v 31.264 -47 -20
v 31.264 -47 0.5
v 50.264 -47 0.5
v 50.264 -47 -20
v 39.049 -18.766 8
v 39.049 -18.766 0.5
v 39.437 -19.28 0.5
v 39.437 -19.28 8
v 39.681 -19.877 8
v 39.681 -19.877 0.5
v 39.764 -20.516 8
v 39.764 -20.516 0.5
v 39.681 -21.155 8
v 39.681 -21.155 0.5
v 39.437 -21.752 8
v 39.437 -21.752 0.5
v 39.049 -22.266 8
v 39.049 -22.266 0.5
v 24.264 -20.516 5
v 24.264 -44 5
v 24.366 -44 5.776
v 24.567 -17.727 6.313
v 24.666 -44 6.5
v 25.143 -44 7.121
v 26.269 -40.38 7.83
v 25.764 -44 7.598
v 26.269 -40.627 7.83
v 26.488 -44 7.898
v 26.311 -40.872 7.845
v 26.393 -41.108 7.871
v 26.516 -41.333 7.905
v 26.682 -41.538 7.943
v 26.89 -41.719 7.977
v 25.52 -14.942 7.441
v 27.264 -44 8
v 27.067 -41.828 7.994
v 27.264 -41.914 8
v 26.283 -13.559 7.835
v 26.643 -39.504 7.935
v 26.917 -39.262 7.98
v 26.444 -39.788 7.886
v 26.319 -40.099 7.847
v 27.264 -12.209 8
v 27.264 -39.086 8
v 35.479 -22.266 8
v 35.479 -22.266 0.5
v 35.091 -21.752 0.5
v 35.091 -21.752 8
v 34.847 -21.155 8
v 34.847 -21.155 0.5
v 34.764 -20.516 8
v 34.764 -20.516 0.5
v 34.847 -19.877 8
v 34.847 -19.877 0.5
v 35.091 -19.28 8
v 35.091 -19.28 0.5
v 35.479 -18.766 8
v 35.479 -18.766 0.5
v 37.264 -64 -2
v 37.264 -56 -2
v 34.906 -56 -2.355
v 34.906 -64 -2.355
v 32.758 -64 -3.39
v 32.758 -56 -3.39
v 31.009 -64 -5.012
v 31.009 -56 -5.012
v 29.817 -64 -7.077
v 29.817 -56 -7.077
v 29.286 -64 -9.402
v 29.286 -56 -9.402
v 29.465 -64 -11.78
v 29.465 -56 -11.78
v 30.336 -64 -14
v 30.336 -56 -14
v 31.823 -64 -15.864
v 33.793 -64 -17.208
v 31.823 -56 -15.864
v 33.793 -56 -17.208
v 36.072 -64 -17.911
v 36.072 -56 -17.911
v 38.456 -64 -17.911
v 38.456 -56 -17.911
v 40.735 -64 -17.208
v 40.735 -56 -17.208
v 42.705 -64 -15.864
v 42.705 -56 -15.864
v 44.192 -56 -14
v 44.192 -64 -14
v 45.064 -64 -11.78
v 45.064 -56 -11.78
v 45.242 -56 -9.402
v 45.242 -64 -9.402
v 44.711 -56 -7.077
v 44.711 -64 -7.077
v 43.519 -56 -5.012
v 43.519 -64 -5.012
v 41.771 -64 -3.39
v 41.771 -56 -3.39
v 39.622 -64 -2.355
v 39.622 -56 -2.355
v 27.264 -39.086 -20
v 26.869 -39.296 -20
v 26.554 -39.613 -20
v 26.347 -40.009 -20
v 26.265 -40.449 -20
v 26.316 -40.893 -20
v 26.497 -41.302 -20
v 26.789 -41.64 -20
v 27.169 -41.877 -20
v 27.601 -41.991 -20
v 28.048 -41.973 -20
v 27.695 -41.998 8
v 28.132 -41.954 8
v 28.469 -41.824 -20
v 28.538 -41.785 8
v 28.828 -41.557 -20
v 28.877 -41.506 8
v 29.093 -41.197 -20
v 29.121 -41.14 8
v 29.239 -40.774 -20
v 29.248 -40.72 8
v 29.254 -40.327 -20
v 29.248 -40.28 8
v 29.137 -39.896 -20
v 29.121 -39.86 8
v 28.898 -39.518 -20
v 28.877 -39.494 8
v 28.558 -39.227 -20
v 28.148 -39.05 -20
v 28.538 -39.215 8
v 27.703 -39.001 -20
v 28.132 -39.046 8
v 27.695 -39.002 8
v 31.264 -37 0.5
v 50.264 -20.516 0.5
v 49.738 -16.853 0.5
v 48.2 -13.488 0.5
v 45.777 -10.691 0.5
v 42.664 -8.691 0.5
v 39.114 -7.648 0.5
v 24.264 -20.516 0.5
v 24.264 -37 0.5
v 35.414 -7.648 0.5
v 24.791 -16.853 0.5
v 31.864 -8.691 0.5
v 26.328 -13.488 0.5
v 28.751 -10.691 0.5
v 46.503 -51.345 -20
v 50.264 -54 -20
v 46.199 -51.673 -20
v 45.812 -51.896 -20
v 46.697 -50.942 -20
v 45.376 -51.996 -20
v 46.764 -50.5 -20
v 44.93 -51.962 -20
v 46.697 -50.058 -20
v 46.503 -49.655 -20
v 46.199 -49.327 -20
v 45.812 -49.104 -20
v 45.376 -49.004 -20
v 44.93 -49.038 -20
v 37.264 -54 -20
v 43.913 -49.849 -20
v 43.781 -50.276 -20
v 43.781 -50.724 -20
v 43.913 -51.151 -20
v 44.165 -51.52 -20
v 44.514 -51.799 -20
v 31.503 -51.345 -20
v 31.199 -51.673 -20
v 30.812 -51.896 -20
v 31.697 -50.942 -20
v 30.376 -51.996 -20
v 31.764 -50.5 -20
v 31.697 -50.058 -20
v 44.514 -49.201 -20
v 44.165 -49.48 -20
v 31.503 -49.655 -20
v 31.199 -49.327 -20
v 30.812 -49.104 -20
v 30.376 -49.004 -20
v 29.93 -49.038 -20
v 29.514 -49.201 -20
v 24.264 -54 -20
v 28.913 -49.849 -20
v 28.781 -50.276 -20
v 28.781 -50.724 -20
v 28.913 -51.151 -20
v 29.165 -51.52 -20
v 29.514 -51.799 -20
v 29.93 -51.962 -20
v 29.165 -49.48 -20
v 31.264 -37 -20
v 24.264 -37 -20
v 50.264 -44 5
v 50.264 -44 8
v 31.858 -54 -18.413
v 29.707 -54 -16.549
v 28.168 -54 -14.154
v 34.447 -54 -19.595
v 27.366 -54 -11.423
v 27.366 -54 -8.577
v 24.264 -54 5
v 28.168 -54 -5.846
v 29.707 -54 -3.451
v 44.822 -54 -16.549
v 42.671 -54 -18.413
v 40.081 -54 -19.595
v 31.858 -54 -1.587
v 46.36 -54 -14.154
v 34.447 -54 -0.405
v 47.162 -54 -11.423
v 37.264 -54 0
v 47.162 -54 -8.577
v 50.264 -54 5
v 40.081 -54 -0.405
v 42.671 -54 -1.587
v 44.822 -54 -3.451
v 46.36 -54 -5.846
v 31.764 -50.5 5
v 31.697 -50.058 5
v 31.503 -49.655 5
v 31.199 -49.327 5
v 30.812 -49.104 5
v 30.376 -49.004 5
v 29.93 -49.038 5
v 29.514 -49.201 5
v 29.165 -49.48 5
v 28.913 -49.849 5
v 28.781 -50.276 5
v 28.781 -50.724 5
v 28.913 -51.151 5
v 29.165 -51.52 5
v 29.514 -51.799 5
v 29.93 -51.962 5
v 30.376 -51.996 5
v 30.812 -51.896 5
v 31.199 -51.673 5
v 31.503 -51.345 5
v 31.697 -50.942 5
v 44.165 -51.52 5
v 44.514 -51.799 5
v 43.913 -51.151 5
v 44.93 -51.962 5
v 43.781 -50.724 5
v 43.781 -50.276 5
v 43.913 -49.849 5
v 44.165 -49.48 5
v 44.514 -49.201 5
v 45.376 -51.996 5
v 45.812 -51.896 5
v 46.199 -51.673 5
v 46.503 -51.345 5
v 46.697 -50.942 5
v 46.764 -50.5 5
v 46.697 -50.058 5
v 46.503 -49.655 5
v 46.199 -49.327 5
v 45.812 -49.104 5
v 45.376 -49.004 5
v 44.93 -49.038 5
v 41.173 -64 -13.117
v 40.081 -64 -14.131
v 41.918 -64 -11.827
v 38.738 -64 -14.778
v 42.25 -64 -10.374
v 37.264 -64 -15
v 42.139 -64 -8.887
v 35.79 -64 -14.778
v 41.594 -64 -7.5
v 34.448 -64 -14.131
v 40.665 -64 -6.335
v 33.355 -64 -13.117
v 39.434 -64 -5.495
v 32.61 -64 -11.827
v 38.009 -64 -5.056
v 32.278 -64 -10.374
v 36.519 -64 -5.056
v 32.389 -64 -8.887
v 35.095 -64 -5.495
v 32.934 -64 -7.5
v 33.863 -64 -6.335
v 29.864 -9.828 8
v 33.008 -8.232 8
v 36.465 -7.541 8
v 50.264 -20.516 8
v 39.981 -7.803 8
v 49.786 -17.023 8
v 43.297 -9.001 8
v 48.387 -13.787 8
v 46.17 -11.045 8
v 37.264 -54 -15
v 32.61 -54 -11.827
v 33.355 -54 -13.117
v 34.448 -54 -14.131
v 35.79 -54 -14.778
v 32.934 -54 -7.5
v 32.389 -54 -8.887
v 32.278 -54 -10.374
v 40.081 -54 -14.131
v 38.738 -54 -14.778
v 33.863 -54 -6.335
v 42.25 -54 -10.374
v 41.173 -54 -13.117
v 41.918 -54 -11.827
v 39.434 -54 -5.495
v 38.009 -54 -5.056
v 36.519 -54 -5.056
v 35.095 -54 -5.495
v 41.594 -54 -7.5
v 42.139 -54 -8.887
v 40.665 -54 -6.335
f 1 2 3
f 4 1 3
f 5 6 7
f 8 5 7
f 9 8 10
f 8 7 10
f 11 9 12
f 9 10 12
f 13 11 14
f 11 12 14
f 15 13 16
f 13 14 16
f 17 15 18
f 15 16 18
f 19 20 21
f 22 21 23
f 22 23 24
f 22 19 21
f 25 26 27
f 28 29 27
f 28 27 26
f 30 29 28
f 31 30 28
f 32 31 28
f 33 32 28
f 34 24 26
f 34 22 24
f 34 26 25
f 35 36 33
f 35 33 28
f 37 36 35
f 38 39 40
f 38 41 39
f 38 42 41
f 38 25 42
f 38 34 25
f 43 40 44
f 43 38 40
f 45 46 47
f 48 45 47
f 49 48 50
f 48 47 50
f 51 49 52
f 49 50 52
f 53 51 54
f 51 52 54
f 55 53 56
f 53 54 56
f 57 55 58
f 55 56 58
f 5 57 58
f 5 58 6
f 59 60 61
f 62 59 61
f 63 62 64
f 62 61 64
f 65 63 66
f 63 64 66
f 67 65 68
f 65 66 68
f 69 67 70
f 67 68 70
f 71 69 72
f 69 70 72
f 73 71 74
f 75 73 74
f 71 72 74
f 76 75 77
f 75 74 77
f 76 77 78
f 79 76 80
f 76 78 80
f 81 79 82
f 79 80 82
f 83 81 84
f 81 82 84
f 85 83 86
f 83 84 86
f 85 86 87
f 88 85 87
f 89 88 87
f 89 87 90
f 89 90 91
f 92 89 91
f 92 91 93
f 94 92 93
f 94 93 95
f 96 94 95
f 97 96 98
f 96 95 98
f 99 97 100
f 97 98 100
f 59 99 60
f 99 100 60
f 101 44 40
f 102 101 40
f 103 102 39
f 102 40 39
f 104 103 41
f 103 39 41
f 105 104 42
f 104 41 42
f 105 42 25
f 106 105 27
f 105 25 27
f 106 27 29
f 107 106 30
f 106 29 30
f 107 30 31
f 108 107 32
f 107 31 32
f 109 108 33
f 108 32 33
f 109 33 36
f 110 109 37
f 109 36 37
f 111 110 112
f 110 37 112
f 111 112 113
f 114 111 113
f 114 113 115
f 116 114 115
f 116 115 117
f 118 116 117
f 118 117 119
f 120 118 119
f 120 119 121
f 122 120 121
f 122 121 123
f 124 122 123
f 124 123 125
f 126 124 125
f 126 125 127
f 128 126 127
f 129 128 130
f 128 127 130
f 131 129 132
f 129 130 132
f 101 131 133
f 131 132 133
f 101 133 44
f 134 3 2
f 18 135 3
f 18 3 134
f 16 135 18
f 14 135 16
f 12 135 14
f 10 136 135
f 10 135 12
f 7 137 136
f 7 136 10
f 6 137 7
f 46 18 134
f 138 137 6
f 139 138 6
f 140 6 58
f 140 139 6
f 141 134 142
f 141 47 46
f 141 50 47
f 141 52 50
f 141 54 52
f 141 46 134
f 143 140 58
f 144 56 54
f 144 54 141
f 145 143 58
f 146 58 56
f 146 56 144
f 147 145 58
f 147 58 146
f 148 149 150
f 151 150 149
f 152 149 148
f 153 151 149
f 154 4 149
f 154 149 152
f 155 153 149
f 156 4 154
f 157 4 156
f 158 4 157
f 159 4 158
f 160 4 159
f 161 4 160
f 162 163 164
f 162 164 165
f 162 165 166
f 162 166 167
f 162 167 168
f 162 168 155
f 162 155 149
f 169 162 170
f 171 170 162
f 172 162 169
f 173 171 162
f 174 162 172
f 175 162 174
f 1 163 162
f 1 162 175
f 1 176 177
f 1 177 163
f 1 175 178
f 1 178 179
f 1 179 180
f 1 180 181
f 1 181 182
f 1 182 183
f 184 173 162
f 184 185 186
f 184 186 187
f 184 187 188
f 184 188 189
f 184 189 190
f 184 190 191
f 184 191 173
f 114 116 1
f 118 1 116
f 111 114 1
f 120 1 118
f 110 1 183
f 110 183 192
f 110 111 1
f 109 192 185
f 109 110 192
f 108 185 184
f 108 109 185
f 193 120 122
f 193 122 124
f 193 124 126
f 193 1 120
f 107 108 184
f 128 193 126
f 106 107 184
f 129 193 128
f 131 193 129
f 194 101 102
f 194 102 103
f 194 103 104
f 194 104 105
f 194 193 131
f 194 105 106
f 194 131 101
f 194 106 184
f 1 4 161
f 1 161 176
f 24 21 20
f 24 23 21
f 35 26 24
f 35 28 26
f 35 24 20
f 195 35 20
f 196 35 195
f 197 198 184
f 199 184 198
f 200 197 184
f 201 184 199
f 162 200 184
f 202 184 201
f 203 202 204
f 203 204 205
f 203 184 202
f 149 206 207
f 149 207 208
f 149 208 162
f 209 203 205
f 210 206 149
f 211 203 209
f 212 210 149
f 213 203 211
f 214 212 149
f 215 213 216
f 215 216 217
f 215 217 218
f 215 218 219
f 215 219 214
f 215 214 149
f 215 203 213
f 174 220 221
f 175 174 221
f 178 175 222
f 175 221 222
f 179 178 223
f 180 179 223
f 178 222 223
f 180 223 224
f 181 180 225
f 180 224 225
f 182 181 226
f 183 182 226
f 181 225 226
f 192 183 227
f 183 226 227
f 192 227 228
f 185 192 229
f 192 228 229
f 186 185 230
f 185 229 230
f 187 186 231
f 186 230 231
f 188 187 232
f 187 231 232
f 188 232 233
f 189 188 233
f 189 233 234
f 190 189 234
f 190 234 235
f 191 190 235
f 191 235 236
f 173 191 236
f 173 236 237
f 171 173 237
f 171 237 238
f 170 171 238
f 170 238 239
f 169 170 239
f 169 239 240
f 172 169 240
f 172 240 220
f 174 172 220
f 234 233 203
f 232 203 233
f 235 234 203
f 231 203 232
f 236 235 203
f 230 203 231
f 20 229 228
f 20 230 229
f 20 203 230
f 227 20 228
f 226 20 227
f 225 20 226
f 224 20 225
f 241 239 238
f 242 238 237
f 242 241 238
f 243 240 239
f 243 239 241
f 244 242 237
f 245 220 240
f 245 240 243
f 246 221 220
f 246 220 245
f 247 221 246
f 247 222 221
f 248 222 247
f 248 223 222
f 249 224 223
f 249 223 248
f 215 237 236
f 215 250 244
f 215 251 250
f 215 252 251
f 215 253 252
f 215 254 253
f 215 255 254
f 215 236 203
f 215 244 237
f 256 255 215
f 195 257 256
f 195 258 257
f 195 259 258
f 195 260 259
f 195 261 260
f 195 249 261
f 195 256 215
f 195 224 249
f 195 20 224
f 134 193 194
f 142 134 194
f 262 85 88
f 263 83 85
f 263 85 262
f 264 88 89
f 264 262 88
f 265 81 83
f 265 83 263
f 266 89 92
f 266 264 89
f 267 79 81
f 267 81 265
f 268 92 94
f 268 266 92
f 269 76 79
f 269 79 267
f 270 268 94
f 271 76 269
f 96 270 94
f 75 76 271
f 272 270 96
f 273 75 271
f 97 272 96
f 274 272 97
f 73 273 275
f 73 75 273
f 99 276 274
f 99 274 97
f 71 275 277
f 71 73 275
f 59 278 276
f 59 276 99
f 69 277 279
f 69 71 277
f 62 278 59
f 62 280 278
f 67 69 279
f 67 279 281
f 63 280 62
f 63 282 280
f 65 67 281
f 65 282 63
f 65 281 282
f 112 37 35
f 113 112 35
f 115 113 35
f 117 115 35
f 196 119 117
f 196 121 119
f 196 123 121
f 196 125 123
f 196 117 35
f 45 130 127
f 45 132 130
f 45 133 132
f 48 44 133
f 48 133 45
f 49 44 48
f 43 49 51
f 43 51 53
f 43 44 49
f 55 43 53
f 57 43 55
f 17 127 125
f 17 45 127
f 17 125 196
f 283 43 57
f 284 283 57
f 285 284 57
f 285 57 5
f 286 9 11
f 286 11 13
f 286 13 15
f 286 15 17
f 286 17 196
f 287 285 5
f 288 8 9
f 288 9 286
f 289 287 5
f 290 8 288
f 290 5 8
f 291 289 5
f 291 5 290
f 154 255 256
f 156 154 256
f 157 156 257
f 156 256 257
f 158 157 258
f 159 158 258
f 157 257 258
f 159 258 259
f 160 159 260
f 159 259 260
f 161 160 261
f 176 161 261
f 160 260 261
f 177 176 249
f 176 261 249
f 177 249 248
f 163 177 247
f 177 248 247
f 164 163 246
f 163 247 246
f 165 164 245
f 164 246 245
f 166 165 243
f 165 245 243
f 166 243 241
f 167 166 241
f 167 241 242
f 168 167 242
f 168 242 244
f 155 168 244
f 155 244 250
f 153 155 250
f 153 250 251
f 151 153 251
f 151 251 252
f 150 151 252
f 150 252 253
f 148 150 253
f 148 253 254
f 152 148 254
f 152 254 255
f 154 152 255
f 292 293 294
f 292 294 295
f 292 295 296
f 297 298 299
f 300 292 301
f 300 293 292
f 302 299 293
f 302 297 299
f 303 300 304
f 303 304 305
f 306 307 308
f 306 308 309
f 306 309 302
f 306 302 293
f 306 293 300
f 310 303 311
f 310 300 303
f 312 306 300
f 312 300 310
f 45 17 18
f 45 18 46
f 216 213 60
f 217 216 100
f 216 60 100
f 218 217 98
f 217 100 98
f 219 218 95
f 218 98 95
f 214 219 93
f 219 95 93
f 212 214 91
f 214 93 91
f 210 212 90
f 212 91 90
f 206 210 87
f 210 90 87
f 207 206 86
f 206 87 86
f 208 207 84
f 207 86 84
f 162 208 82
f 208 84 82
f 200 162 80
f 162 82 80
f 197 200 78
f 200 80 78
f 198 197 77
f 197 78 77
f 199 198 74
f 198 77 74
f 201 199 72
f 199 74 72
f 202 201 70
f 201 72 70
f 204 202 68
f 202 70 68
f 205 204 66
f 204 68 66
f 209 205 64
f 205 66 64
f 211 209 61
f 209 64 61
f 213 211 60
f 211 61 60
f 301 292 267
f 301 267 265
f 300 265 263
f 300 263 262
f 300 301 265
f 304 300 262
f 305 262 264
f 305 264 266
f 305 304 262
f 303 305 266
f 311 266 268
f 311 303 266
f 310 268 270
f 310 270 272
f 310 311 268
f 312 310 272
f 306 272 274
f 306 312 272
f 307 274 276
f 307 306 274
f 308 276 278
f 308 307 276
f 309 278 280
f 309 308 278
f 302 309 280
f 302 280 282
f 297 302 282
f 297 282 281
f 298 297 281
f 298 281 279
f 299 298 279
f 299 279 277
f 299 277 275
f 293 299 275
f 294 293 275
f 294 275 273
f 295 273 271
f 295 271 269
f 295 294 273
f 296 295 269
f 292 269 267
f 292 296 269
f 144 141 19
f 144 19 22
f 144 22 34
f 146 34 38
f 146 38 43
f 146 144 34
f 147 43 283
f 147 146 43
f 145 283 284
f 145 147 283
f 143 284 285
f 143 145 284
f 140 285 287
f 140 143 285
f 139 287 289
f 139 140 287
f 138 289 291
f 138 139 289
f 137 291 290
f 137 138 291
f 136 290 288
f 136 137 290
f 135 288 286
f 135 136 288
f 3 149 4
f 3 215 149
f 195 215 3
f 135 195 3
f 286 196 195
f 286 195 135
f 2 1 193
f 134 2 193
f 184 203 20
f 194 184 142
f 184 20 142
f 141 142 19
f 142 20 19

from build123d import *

# Parameters (mm, degrees)
SKETCH1_W           = 26
SKETCH1_H           = 50
BOSS_EXTRUDE1_DEPTH = 8
SKETCH2_W           = 26
SKETCH2_H           = 50
BOSS_EXTRUDE2_DEPTH = 8
SKETCH3_W           = 26
SKETCH3_H           = 7
BOSS_EXTRUDE3_DEPTH = 36
SKETCH4_R           = 8
SKETCH4_R_2         = 5
BOSS_EXTRUDE4_DEPTH = 10
FILLET2_R           = 3
SKETCH6_W           = 7
SKETCH6_H           = 17
BOSS_EXTRUDE5_DEPTH = 20
CHAMFER1_SIZE       = 2
CUT_EXTRUDE2_DEPTH  = 0.5
CUT_EXTRUDE3_DEPTH  = 0.5
CUT_EXTRUDE4_START  = -36
CUT_EXTRUDE4_DEPTH  = 36
SKETCH11_W          = 26
SKETCH11_H          = 10
CUT_EXTRUDE5_DEPTH  = 3
SKETCH12_W          = 26
SKETCH12_H          = 10
CUT_EXTRUDE6_DEPTH  = 3
CUT_EXTRUDE7_REACH  = 90.986
SKETCH13_R          = 1.5
SKETCH14_W          = 39.670907723
SKETCH14_H          = 70.738486061
CUT_EXTRUDE8_DEPTH  = 8


with BuildPart() as part:
    # Sketch1 → Boss-Extrude1 (new body)
    with BuildSketch(Plane.XY):
        with Locations((37.264100782, -29)):
            Rectangle(SKETCH1_W, SKETCH1_H)
        with BuildLine():
            Line((39.049457889, -22.265997948), (35.478743675, -22.265997948))
            ThreePointArc((35.478743675, -22.265997948), (34.764100782, -20.515997948), (35.478743675, -18.765997947))
            Line((35.478743675, -18.765997947), (39.049457889, -18.765997947))
            ThreePointArc((39.049457889, -18.765997947), (39.764100782, -20.515997948), (39.049457889, -22.265997948))
        make_face(mode=Mode.SUBTRACT)
    extrude(amount=BOSS_EXTRUDE1_DEPTH)



with BuildPart() as body_2:
    # Sketch2 → Boss-Extrude2 (new body)
    with BuildSketch(Plane(origin=(0, 0, -20), x_dir=(-1, 0, 0), z_dir=(0, 0, -1))):
        with Locations((-37.264100782, -29)):
            Rectangle(SKETCH2_W, SKETCH2_H)
        with BuildLine():
            Line((-39.049457889, -18.765997947), (-35.478743675, -18.765997947))
            ThreePointArc((-35.478743675, -18.765997947), (-34.764100782, -20.515997948), (-35.478743675, -22.265997948))
            Line((-35.478743675, -22.265997948), (-39.049457889, -22.265997948))
            ThreePointArc((-39.049457889, -22.265997948), (-39.764100782, -20.515997948), (-39.049457889, -18.765997947))
        make_face(mode=Mode.SUBTRACT)
    extrude(amount=BOSS_EXTRUDE2_DEPTH)


with BuildPart() as part_1:
    add(part.part)

    add(body_2.part)  # Boss-Extrude3 merges body 2
    # Sketch3 → Boss-Extrude3 (add)
    with BuildSketch(Plane.XY.offset(8)):
        with Locations((37.264100782, -50.5)):
            Rectangle(SKETCH3_W, SKETCH3_H)
    extrude(amount=-BOSS_EXTRUDE3_DEPTH)

    # Sketch4 → Boss-Extrude4 (add)
    with BuildSketch(Plane.XZ.offset(54)):
        with Locations(Location((37.264100782, -10, 0), (0, 0, 90))):
            Circle(SKETCH4_R)
        with Locations(Location((37.264100782, -10, 0), (0, 0, 270))):
            Circle(SKETCH4_R_2, mode=Mode.SUBTRACT)
    extrude(amount=BOSS_EXTRUDE4_DEPTH)

    # Fillet2
    fillet2_edges = [part_1.edges().sort_by_distance(p)[0] for p in [
        (24.264100782, -29, 8),
        (24.264100782, -29, -28),
    ]]
    fillet(fillet2_edges, radius=FILLET2_R)

    # Sketch6 → Boss-Extrude5 (add)
    with BuildSketch(Plane.XY.offset(-20)):
        with Locations((27.764100782, -45.5)):
            Rectangle(SKETCH6_W, SKETCH6_H)
    extrude(amount=BOSS_EXTRUDE5_DEPTH)

    # Chamfer1
    chamfer1_edges = [part_1.edges().sort_by_distance(p)[0] for p in [
        (37.264100782, -54, -18),
    ]]
    chamfer(chamfer1_edges, length=CHAMFER1_SIZE)

    # Sketch7 → Cut-Extrude2 (cut)
    with BuildSketch(Plane(origin=(0, 0, 0), x_dir=(-1, 0, 0), z_dir=(0, 0, -1))):
        Polygon((-50.264100782, -4), (-50.264100782, -47), (-31.264100782, -47), (-31.264100782, -37), (-24.264100782, -37), (-24.264100782, -4), align=None)
    extrude(amount=-CUT_EXTRUDE2_DEPTH, mode=Mode.SUBTRACT)

    # Sketch8 → Cut-Extrude3 (cut)
    with BuildSketch(Plane.XY.offset(-20)):
        Polygon((50.264100782, -47), (50.264100782, -4), (24.264100782, -4), (24.264100782, -37), (31.264100782, -37), (31.264100782, -47), align=None)
    extrude(amount=-CUT_EXTRUDE3_DEPTH, mode=Mode.SUBTRACT)

    # Sketch10 → Cut-Extrude4 (cut)
    with BuildSketch(Plane.XY.offset(8).offset(CUT_EXTRUDE4_START)):
        with BuildLine():
            Line((50.264100782, -20.515997948), (50.264100782, 2.26582648))
            Line((50.264100782, 2.26582648), (24.264100782, 2.26582648))
            Line((24.264100782, 2.26582648), (24.264100782, -20.515997948))
            ThreePointArc((24.264100782, -20.515997948), (37.264100782, -7.515997948), (50.264100782, -20.515997948))
        make_face()
    extrude(amount=CUT_EXTRUDE4_DEPTH, mode=Mode.SUBTRACT)

    # Sketch11 → Cut-Extrude5 (cut)
    with BuildSketch(Plane.XY.offset(8)):
        with Locations((37.264100782, -49)):
            Rectangle(SKETCH11_W, SKETCH11_H)
    extrude(amount=-CUT_EXTRUDE5_DEPTH, mode=Mode.SUBTRACT)

    # Sketch12 → Cut-Extrude6 (cut)
    with BuildSketch(Plane(origin=(0, 0, -28), x_dir=(-1, 0, 0), z_dir=(0, 0, -1))):
        with Locations((-37.264100782, -49)):
            Rectangle(SKETCH12_W, SKETCH12_H)
    extrude(amount=-CUT_EXTRUDE6_DEPTH, mode=Mode.SUBTRACT)

    # Cut-Extrude7: up to this face of the body (flat: up to its plane)
    cut_extrude7_end = Plane(part_1.part.faces().sort_by_distance((38.560022368, -26.898937337, -28))[0])
    # Sketch13 → Cut-Extrude7 (cut, up to the picked face)
    with BuildSketch(Plane.XY.offset(8), mode=Mode.PRIVATE) as cut_extrude7_sk1:
        with Locations((45.264100782, -50.5)):
            Circle(SKETCH13_R)
    cut_extrude7_tool1 = split(extrude(cut_extrude7_sk1.sketch, amount=-CUT_EXTRUDE7_REACH, mode=Mode.PRIVATE), bisect_by=cut_extrude7_end, keep=Keep.BOTH, mode=Mode.PRIVATE)
    # Sketch13 → Cut-Extrude7 (cut, up to the picked face)
    with BuildSketch(Plane.XY.offset(8), mode=Mode.PRIVATE) as cut_extrude7_sk2:
        with Locations((30.264100782, -50.5)):
            Circle(SKETCH13_R)
    cut_extrude7_tool2 = split(extrude(cut_extrude7_sk2.sketch, amount=-CUT_EXTRUDE7_REACH, mode=Mode.PRIVATE), bisect_by=cut_extrude7_end, keep=Keep.BOTH, mode=Mode.PRIVATE)
    # Sketch13 → Cut-Extrude7 (cut, up to the picked face)
    with BuildSketch(Plane.XY.offset(8), mode=Mode.PRIVATE) as cut_extrude7_sk3:
        with Locations(Location((27.764100782, -40.5, 0), (0, 0, 109.471220634))):
            Circle(SKETCH13_R)
    cut_extrude7_tool3 = split(extrude(cut_extrude7_sk3.sketch, amount=-CUT_EXTRUDE7_REACH, mode=Mode.PRIVATE), bisect_by=cut_extrude7_end, keep=Keep.BOTH, mode=Mode.PRIVATE)
    add(cut_extrude7_tool1.solids().sort_by(Axis((45.264101, -50.5, 8), (0, 0, -1)))[0], mode=Mode.SUBTRACT)
    add(cut_extrude7_tool2.solids().sort_by(Axis((30.264101, -50.5, 8), (0, 0, -1)))[0], mode=Mode.SUBTRACT)
    add(cut_extrude7_tool3.solids().sort_by(Axis((27.764101, -40.5, 8), (0, 0, -1)))[0], mode=Mode.SUBTRACT)

    # Sketch14 → Cut-Extrude8 (cut)
    with BuildSketch(Plane(origin=(0, 0, -28), x_dir=(-1, 0, 0), z_dir=(0, 0, -1))):
        with Locations((-35.76618016, -37.229796089)):
            Rectangle(SKETCH14_W, SKETCH14_H)
    extrude(amount=-CUT_EXTRUDE8_DEPTH, mode=Mode.SUBTRACT)


solid = part_1.part
